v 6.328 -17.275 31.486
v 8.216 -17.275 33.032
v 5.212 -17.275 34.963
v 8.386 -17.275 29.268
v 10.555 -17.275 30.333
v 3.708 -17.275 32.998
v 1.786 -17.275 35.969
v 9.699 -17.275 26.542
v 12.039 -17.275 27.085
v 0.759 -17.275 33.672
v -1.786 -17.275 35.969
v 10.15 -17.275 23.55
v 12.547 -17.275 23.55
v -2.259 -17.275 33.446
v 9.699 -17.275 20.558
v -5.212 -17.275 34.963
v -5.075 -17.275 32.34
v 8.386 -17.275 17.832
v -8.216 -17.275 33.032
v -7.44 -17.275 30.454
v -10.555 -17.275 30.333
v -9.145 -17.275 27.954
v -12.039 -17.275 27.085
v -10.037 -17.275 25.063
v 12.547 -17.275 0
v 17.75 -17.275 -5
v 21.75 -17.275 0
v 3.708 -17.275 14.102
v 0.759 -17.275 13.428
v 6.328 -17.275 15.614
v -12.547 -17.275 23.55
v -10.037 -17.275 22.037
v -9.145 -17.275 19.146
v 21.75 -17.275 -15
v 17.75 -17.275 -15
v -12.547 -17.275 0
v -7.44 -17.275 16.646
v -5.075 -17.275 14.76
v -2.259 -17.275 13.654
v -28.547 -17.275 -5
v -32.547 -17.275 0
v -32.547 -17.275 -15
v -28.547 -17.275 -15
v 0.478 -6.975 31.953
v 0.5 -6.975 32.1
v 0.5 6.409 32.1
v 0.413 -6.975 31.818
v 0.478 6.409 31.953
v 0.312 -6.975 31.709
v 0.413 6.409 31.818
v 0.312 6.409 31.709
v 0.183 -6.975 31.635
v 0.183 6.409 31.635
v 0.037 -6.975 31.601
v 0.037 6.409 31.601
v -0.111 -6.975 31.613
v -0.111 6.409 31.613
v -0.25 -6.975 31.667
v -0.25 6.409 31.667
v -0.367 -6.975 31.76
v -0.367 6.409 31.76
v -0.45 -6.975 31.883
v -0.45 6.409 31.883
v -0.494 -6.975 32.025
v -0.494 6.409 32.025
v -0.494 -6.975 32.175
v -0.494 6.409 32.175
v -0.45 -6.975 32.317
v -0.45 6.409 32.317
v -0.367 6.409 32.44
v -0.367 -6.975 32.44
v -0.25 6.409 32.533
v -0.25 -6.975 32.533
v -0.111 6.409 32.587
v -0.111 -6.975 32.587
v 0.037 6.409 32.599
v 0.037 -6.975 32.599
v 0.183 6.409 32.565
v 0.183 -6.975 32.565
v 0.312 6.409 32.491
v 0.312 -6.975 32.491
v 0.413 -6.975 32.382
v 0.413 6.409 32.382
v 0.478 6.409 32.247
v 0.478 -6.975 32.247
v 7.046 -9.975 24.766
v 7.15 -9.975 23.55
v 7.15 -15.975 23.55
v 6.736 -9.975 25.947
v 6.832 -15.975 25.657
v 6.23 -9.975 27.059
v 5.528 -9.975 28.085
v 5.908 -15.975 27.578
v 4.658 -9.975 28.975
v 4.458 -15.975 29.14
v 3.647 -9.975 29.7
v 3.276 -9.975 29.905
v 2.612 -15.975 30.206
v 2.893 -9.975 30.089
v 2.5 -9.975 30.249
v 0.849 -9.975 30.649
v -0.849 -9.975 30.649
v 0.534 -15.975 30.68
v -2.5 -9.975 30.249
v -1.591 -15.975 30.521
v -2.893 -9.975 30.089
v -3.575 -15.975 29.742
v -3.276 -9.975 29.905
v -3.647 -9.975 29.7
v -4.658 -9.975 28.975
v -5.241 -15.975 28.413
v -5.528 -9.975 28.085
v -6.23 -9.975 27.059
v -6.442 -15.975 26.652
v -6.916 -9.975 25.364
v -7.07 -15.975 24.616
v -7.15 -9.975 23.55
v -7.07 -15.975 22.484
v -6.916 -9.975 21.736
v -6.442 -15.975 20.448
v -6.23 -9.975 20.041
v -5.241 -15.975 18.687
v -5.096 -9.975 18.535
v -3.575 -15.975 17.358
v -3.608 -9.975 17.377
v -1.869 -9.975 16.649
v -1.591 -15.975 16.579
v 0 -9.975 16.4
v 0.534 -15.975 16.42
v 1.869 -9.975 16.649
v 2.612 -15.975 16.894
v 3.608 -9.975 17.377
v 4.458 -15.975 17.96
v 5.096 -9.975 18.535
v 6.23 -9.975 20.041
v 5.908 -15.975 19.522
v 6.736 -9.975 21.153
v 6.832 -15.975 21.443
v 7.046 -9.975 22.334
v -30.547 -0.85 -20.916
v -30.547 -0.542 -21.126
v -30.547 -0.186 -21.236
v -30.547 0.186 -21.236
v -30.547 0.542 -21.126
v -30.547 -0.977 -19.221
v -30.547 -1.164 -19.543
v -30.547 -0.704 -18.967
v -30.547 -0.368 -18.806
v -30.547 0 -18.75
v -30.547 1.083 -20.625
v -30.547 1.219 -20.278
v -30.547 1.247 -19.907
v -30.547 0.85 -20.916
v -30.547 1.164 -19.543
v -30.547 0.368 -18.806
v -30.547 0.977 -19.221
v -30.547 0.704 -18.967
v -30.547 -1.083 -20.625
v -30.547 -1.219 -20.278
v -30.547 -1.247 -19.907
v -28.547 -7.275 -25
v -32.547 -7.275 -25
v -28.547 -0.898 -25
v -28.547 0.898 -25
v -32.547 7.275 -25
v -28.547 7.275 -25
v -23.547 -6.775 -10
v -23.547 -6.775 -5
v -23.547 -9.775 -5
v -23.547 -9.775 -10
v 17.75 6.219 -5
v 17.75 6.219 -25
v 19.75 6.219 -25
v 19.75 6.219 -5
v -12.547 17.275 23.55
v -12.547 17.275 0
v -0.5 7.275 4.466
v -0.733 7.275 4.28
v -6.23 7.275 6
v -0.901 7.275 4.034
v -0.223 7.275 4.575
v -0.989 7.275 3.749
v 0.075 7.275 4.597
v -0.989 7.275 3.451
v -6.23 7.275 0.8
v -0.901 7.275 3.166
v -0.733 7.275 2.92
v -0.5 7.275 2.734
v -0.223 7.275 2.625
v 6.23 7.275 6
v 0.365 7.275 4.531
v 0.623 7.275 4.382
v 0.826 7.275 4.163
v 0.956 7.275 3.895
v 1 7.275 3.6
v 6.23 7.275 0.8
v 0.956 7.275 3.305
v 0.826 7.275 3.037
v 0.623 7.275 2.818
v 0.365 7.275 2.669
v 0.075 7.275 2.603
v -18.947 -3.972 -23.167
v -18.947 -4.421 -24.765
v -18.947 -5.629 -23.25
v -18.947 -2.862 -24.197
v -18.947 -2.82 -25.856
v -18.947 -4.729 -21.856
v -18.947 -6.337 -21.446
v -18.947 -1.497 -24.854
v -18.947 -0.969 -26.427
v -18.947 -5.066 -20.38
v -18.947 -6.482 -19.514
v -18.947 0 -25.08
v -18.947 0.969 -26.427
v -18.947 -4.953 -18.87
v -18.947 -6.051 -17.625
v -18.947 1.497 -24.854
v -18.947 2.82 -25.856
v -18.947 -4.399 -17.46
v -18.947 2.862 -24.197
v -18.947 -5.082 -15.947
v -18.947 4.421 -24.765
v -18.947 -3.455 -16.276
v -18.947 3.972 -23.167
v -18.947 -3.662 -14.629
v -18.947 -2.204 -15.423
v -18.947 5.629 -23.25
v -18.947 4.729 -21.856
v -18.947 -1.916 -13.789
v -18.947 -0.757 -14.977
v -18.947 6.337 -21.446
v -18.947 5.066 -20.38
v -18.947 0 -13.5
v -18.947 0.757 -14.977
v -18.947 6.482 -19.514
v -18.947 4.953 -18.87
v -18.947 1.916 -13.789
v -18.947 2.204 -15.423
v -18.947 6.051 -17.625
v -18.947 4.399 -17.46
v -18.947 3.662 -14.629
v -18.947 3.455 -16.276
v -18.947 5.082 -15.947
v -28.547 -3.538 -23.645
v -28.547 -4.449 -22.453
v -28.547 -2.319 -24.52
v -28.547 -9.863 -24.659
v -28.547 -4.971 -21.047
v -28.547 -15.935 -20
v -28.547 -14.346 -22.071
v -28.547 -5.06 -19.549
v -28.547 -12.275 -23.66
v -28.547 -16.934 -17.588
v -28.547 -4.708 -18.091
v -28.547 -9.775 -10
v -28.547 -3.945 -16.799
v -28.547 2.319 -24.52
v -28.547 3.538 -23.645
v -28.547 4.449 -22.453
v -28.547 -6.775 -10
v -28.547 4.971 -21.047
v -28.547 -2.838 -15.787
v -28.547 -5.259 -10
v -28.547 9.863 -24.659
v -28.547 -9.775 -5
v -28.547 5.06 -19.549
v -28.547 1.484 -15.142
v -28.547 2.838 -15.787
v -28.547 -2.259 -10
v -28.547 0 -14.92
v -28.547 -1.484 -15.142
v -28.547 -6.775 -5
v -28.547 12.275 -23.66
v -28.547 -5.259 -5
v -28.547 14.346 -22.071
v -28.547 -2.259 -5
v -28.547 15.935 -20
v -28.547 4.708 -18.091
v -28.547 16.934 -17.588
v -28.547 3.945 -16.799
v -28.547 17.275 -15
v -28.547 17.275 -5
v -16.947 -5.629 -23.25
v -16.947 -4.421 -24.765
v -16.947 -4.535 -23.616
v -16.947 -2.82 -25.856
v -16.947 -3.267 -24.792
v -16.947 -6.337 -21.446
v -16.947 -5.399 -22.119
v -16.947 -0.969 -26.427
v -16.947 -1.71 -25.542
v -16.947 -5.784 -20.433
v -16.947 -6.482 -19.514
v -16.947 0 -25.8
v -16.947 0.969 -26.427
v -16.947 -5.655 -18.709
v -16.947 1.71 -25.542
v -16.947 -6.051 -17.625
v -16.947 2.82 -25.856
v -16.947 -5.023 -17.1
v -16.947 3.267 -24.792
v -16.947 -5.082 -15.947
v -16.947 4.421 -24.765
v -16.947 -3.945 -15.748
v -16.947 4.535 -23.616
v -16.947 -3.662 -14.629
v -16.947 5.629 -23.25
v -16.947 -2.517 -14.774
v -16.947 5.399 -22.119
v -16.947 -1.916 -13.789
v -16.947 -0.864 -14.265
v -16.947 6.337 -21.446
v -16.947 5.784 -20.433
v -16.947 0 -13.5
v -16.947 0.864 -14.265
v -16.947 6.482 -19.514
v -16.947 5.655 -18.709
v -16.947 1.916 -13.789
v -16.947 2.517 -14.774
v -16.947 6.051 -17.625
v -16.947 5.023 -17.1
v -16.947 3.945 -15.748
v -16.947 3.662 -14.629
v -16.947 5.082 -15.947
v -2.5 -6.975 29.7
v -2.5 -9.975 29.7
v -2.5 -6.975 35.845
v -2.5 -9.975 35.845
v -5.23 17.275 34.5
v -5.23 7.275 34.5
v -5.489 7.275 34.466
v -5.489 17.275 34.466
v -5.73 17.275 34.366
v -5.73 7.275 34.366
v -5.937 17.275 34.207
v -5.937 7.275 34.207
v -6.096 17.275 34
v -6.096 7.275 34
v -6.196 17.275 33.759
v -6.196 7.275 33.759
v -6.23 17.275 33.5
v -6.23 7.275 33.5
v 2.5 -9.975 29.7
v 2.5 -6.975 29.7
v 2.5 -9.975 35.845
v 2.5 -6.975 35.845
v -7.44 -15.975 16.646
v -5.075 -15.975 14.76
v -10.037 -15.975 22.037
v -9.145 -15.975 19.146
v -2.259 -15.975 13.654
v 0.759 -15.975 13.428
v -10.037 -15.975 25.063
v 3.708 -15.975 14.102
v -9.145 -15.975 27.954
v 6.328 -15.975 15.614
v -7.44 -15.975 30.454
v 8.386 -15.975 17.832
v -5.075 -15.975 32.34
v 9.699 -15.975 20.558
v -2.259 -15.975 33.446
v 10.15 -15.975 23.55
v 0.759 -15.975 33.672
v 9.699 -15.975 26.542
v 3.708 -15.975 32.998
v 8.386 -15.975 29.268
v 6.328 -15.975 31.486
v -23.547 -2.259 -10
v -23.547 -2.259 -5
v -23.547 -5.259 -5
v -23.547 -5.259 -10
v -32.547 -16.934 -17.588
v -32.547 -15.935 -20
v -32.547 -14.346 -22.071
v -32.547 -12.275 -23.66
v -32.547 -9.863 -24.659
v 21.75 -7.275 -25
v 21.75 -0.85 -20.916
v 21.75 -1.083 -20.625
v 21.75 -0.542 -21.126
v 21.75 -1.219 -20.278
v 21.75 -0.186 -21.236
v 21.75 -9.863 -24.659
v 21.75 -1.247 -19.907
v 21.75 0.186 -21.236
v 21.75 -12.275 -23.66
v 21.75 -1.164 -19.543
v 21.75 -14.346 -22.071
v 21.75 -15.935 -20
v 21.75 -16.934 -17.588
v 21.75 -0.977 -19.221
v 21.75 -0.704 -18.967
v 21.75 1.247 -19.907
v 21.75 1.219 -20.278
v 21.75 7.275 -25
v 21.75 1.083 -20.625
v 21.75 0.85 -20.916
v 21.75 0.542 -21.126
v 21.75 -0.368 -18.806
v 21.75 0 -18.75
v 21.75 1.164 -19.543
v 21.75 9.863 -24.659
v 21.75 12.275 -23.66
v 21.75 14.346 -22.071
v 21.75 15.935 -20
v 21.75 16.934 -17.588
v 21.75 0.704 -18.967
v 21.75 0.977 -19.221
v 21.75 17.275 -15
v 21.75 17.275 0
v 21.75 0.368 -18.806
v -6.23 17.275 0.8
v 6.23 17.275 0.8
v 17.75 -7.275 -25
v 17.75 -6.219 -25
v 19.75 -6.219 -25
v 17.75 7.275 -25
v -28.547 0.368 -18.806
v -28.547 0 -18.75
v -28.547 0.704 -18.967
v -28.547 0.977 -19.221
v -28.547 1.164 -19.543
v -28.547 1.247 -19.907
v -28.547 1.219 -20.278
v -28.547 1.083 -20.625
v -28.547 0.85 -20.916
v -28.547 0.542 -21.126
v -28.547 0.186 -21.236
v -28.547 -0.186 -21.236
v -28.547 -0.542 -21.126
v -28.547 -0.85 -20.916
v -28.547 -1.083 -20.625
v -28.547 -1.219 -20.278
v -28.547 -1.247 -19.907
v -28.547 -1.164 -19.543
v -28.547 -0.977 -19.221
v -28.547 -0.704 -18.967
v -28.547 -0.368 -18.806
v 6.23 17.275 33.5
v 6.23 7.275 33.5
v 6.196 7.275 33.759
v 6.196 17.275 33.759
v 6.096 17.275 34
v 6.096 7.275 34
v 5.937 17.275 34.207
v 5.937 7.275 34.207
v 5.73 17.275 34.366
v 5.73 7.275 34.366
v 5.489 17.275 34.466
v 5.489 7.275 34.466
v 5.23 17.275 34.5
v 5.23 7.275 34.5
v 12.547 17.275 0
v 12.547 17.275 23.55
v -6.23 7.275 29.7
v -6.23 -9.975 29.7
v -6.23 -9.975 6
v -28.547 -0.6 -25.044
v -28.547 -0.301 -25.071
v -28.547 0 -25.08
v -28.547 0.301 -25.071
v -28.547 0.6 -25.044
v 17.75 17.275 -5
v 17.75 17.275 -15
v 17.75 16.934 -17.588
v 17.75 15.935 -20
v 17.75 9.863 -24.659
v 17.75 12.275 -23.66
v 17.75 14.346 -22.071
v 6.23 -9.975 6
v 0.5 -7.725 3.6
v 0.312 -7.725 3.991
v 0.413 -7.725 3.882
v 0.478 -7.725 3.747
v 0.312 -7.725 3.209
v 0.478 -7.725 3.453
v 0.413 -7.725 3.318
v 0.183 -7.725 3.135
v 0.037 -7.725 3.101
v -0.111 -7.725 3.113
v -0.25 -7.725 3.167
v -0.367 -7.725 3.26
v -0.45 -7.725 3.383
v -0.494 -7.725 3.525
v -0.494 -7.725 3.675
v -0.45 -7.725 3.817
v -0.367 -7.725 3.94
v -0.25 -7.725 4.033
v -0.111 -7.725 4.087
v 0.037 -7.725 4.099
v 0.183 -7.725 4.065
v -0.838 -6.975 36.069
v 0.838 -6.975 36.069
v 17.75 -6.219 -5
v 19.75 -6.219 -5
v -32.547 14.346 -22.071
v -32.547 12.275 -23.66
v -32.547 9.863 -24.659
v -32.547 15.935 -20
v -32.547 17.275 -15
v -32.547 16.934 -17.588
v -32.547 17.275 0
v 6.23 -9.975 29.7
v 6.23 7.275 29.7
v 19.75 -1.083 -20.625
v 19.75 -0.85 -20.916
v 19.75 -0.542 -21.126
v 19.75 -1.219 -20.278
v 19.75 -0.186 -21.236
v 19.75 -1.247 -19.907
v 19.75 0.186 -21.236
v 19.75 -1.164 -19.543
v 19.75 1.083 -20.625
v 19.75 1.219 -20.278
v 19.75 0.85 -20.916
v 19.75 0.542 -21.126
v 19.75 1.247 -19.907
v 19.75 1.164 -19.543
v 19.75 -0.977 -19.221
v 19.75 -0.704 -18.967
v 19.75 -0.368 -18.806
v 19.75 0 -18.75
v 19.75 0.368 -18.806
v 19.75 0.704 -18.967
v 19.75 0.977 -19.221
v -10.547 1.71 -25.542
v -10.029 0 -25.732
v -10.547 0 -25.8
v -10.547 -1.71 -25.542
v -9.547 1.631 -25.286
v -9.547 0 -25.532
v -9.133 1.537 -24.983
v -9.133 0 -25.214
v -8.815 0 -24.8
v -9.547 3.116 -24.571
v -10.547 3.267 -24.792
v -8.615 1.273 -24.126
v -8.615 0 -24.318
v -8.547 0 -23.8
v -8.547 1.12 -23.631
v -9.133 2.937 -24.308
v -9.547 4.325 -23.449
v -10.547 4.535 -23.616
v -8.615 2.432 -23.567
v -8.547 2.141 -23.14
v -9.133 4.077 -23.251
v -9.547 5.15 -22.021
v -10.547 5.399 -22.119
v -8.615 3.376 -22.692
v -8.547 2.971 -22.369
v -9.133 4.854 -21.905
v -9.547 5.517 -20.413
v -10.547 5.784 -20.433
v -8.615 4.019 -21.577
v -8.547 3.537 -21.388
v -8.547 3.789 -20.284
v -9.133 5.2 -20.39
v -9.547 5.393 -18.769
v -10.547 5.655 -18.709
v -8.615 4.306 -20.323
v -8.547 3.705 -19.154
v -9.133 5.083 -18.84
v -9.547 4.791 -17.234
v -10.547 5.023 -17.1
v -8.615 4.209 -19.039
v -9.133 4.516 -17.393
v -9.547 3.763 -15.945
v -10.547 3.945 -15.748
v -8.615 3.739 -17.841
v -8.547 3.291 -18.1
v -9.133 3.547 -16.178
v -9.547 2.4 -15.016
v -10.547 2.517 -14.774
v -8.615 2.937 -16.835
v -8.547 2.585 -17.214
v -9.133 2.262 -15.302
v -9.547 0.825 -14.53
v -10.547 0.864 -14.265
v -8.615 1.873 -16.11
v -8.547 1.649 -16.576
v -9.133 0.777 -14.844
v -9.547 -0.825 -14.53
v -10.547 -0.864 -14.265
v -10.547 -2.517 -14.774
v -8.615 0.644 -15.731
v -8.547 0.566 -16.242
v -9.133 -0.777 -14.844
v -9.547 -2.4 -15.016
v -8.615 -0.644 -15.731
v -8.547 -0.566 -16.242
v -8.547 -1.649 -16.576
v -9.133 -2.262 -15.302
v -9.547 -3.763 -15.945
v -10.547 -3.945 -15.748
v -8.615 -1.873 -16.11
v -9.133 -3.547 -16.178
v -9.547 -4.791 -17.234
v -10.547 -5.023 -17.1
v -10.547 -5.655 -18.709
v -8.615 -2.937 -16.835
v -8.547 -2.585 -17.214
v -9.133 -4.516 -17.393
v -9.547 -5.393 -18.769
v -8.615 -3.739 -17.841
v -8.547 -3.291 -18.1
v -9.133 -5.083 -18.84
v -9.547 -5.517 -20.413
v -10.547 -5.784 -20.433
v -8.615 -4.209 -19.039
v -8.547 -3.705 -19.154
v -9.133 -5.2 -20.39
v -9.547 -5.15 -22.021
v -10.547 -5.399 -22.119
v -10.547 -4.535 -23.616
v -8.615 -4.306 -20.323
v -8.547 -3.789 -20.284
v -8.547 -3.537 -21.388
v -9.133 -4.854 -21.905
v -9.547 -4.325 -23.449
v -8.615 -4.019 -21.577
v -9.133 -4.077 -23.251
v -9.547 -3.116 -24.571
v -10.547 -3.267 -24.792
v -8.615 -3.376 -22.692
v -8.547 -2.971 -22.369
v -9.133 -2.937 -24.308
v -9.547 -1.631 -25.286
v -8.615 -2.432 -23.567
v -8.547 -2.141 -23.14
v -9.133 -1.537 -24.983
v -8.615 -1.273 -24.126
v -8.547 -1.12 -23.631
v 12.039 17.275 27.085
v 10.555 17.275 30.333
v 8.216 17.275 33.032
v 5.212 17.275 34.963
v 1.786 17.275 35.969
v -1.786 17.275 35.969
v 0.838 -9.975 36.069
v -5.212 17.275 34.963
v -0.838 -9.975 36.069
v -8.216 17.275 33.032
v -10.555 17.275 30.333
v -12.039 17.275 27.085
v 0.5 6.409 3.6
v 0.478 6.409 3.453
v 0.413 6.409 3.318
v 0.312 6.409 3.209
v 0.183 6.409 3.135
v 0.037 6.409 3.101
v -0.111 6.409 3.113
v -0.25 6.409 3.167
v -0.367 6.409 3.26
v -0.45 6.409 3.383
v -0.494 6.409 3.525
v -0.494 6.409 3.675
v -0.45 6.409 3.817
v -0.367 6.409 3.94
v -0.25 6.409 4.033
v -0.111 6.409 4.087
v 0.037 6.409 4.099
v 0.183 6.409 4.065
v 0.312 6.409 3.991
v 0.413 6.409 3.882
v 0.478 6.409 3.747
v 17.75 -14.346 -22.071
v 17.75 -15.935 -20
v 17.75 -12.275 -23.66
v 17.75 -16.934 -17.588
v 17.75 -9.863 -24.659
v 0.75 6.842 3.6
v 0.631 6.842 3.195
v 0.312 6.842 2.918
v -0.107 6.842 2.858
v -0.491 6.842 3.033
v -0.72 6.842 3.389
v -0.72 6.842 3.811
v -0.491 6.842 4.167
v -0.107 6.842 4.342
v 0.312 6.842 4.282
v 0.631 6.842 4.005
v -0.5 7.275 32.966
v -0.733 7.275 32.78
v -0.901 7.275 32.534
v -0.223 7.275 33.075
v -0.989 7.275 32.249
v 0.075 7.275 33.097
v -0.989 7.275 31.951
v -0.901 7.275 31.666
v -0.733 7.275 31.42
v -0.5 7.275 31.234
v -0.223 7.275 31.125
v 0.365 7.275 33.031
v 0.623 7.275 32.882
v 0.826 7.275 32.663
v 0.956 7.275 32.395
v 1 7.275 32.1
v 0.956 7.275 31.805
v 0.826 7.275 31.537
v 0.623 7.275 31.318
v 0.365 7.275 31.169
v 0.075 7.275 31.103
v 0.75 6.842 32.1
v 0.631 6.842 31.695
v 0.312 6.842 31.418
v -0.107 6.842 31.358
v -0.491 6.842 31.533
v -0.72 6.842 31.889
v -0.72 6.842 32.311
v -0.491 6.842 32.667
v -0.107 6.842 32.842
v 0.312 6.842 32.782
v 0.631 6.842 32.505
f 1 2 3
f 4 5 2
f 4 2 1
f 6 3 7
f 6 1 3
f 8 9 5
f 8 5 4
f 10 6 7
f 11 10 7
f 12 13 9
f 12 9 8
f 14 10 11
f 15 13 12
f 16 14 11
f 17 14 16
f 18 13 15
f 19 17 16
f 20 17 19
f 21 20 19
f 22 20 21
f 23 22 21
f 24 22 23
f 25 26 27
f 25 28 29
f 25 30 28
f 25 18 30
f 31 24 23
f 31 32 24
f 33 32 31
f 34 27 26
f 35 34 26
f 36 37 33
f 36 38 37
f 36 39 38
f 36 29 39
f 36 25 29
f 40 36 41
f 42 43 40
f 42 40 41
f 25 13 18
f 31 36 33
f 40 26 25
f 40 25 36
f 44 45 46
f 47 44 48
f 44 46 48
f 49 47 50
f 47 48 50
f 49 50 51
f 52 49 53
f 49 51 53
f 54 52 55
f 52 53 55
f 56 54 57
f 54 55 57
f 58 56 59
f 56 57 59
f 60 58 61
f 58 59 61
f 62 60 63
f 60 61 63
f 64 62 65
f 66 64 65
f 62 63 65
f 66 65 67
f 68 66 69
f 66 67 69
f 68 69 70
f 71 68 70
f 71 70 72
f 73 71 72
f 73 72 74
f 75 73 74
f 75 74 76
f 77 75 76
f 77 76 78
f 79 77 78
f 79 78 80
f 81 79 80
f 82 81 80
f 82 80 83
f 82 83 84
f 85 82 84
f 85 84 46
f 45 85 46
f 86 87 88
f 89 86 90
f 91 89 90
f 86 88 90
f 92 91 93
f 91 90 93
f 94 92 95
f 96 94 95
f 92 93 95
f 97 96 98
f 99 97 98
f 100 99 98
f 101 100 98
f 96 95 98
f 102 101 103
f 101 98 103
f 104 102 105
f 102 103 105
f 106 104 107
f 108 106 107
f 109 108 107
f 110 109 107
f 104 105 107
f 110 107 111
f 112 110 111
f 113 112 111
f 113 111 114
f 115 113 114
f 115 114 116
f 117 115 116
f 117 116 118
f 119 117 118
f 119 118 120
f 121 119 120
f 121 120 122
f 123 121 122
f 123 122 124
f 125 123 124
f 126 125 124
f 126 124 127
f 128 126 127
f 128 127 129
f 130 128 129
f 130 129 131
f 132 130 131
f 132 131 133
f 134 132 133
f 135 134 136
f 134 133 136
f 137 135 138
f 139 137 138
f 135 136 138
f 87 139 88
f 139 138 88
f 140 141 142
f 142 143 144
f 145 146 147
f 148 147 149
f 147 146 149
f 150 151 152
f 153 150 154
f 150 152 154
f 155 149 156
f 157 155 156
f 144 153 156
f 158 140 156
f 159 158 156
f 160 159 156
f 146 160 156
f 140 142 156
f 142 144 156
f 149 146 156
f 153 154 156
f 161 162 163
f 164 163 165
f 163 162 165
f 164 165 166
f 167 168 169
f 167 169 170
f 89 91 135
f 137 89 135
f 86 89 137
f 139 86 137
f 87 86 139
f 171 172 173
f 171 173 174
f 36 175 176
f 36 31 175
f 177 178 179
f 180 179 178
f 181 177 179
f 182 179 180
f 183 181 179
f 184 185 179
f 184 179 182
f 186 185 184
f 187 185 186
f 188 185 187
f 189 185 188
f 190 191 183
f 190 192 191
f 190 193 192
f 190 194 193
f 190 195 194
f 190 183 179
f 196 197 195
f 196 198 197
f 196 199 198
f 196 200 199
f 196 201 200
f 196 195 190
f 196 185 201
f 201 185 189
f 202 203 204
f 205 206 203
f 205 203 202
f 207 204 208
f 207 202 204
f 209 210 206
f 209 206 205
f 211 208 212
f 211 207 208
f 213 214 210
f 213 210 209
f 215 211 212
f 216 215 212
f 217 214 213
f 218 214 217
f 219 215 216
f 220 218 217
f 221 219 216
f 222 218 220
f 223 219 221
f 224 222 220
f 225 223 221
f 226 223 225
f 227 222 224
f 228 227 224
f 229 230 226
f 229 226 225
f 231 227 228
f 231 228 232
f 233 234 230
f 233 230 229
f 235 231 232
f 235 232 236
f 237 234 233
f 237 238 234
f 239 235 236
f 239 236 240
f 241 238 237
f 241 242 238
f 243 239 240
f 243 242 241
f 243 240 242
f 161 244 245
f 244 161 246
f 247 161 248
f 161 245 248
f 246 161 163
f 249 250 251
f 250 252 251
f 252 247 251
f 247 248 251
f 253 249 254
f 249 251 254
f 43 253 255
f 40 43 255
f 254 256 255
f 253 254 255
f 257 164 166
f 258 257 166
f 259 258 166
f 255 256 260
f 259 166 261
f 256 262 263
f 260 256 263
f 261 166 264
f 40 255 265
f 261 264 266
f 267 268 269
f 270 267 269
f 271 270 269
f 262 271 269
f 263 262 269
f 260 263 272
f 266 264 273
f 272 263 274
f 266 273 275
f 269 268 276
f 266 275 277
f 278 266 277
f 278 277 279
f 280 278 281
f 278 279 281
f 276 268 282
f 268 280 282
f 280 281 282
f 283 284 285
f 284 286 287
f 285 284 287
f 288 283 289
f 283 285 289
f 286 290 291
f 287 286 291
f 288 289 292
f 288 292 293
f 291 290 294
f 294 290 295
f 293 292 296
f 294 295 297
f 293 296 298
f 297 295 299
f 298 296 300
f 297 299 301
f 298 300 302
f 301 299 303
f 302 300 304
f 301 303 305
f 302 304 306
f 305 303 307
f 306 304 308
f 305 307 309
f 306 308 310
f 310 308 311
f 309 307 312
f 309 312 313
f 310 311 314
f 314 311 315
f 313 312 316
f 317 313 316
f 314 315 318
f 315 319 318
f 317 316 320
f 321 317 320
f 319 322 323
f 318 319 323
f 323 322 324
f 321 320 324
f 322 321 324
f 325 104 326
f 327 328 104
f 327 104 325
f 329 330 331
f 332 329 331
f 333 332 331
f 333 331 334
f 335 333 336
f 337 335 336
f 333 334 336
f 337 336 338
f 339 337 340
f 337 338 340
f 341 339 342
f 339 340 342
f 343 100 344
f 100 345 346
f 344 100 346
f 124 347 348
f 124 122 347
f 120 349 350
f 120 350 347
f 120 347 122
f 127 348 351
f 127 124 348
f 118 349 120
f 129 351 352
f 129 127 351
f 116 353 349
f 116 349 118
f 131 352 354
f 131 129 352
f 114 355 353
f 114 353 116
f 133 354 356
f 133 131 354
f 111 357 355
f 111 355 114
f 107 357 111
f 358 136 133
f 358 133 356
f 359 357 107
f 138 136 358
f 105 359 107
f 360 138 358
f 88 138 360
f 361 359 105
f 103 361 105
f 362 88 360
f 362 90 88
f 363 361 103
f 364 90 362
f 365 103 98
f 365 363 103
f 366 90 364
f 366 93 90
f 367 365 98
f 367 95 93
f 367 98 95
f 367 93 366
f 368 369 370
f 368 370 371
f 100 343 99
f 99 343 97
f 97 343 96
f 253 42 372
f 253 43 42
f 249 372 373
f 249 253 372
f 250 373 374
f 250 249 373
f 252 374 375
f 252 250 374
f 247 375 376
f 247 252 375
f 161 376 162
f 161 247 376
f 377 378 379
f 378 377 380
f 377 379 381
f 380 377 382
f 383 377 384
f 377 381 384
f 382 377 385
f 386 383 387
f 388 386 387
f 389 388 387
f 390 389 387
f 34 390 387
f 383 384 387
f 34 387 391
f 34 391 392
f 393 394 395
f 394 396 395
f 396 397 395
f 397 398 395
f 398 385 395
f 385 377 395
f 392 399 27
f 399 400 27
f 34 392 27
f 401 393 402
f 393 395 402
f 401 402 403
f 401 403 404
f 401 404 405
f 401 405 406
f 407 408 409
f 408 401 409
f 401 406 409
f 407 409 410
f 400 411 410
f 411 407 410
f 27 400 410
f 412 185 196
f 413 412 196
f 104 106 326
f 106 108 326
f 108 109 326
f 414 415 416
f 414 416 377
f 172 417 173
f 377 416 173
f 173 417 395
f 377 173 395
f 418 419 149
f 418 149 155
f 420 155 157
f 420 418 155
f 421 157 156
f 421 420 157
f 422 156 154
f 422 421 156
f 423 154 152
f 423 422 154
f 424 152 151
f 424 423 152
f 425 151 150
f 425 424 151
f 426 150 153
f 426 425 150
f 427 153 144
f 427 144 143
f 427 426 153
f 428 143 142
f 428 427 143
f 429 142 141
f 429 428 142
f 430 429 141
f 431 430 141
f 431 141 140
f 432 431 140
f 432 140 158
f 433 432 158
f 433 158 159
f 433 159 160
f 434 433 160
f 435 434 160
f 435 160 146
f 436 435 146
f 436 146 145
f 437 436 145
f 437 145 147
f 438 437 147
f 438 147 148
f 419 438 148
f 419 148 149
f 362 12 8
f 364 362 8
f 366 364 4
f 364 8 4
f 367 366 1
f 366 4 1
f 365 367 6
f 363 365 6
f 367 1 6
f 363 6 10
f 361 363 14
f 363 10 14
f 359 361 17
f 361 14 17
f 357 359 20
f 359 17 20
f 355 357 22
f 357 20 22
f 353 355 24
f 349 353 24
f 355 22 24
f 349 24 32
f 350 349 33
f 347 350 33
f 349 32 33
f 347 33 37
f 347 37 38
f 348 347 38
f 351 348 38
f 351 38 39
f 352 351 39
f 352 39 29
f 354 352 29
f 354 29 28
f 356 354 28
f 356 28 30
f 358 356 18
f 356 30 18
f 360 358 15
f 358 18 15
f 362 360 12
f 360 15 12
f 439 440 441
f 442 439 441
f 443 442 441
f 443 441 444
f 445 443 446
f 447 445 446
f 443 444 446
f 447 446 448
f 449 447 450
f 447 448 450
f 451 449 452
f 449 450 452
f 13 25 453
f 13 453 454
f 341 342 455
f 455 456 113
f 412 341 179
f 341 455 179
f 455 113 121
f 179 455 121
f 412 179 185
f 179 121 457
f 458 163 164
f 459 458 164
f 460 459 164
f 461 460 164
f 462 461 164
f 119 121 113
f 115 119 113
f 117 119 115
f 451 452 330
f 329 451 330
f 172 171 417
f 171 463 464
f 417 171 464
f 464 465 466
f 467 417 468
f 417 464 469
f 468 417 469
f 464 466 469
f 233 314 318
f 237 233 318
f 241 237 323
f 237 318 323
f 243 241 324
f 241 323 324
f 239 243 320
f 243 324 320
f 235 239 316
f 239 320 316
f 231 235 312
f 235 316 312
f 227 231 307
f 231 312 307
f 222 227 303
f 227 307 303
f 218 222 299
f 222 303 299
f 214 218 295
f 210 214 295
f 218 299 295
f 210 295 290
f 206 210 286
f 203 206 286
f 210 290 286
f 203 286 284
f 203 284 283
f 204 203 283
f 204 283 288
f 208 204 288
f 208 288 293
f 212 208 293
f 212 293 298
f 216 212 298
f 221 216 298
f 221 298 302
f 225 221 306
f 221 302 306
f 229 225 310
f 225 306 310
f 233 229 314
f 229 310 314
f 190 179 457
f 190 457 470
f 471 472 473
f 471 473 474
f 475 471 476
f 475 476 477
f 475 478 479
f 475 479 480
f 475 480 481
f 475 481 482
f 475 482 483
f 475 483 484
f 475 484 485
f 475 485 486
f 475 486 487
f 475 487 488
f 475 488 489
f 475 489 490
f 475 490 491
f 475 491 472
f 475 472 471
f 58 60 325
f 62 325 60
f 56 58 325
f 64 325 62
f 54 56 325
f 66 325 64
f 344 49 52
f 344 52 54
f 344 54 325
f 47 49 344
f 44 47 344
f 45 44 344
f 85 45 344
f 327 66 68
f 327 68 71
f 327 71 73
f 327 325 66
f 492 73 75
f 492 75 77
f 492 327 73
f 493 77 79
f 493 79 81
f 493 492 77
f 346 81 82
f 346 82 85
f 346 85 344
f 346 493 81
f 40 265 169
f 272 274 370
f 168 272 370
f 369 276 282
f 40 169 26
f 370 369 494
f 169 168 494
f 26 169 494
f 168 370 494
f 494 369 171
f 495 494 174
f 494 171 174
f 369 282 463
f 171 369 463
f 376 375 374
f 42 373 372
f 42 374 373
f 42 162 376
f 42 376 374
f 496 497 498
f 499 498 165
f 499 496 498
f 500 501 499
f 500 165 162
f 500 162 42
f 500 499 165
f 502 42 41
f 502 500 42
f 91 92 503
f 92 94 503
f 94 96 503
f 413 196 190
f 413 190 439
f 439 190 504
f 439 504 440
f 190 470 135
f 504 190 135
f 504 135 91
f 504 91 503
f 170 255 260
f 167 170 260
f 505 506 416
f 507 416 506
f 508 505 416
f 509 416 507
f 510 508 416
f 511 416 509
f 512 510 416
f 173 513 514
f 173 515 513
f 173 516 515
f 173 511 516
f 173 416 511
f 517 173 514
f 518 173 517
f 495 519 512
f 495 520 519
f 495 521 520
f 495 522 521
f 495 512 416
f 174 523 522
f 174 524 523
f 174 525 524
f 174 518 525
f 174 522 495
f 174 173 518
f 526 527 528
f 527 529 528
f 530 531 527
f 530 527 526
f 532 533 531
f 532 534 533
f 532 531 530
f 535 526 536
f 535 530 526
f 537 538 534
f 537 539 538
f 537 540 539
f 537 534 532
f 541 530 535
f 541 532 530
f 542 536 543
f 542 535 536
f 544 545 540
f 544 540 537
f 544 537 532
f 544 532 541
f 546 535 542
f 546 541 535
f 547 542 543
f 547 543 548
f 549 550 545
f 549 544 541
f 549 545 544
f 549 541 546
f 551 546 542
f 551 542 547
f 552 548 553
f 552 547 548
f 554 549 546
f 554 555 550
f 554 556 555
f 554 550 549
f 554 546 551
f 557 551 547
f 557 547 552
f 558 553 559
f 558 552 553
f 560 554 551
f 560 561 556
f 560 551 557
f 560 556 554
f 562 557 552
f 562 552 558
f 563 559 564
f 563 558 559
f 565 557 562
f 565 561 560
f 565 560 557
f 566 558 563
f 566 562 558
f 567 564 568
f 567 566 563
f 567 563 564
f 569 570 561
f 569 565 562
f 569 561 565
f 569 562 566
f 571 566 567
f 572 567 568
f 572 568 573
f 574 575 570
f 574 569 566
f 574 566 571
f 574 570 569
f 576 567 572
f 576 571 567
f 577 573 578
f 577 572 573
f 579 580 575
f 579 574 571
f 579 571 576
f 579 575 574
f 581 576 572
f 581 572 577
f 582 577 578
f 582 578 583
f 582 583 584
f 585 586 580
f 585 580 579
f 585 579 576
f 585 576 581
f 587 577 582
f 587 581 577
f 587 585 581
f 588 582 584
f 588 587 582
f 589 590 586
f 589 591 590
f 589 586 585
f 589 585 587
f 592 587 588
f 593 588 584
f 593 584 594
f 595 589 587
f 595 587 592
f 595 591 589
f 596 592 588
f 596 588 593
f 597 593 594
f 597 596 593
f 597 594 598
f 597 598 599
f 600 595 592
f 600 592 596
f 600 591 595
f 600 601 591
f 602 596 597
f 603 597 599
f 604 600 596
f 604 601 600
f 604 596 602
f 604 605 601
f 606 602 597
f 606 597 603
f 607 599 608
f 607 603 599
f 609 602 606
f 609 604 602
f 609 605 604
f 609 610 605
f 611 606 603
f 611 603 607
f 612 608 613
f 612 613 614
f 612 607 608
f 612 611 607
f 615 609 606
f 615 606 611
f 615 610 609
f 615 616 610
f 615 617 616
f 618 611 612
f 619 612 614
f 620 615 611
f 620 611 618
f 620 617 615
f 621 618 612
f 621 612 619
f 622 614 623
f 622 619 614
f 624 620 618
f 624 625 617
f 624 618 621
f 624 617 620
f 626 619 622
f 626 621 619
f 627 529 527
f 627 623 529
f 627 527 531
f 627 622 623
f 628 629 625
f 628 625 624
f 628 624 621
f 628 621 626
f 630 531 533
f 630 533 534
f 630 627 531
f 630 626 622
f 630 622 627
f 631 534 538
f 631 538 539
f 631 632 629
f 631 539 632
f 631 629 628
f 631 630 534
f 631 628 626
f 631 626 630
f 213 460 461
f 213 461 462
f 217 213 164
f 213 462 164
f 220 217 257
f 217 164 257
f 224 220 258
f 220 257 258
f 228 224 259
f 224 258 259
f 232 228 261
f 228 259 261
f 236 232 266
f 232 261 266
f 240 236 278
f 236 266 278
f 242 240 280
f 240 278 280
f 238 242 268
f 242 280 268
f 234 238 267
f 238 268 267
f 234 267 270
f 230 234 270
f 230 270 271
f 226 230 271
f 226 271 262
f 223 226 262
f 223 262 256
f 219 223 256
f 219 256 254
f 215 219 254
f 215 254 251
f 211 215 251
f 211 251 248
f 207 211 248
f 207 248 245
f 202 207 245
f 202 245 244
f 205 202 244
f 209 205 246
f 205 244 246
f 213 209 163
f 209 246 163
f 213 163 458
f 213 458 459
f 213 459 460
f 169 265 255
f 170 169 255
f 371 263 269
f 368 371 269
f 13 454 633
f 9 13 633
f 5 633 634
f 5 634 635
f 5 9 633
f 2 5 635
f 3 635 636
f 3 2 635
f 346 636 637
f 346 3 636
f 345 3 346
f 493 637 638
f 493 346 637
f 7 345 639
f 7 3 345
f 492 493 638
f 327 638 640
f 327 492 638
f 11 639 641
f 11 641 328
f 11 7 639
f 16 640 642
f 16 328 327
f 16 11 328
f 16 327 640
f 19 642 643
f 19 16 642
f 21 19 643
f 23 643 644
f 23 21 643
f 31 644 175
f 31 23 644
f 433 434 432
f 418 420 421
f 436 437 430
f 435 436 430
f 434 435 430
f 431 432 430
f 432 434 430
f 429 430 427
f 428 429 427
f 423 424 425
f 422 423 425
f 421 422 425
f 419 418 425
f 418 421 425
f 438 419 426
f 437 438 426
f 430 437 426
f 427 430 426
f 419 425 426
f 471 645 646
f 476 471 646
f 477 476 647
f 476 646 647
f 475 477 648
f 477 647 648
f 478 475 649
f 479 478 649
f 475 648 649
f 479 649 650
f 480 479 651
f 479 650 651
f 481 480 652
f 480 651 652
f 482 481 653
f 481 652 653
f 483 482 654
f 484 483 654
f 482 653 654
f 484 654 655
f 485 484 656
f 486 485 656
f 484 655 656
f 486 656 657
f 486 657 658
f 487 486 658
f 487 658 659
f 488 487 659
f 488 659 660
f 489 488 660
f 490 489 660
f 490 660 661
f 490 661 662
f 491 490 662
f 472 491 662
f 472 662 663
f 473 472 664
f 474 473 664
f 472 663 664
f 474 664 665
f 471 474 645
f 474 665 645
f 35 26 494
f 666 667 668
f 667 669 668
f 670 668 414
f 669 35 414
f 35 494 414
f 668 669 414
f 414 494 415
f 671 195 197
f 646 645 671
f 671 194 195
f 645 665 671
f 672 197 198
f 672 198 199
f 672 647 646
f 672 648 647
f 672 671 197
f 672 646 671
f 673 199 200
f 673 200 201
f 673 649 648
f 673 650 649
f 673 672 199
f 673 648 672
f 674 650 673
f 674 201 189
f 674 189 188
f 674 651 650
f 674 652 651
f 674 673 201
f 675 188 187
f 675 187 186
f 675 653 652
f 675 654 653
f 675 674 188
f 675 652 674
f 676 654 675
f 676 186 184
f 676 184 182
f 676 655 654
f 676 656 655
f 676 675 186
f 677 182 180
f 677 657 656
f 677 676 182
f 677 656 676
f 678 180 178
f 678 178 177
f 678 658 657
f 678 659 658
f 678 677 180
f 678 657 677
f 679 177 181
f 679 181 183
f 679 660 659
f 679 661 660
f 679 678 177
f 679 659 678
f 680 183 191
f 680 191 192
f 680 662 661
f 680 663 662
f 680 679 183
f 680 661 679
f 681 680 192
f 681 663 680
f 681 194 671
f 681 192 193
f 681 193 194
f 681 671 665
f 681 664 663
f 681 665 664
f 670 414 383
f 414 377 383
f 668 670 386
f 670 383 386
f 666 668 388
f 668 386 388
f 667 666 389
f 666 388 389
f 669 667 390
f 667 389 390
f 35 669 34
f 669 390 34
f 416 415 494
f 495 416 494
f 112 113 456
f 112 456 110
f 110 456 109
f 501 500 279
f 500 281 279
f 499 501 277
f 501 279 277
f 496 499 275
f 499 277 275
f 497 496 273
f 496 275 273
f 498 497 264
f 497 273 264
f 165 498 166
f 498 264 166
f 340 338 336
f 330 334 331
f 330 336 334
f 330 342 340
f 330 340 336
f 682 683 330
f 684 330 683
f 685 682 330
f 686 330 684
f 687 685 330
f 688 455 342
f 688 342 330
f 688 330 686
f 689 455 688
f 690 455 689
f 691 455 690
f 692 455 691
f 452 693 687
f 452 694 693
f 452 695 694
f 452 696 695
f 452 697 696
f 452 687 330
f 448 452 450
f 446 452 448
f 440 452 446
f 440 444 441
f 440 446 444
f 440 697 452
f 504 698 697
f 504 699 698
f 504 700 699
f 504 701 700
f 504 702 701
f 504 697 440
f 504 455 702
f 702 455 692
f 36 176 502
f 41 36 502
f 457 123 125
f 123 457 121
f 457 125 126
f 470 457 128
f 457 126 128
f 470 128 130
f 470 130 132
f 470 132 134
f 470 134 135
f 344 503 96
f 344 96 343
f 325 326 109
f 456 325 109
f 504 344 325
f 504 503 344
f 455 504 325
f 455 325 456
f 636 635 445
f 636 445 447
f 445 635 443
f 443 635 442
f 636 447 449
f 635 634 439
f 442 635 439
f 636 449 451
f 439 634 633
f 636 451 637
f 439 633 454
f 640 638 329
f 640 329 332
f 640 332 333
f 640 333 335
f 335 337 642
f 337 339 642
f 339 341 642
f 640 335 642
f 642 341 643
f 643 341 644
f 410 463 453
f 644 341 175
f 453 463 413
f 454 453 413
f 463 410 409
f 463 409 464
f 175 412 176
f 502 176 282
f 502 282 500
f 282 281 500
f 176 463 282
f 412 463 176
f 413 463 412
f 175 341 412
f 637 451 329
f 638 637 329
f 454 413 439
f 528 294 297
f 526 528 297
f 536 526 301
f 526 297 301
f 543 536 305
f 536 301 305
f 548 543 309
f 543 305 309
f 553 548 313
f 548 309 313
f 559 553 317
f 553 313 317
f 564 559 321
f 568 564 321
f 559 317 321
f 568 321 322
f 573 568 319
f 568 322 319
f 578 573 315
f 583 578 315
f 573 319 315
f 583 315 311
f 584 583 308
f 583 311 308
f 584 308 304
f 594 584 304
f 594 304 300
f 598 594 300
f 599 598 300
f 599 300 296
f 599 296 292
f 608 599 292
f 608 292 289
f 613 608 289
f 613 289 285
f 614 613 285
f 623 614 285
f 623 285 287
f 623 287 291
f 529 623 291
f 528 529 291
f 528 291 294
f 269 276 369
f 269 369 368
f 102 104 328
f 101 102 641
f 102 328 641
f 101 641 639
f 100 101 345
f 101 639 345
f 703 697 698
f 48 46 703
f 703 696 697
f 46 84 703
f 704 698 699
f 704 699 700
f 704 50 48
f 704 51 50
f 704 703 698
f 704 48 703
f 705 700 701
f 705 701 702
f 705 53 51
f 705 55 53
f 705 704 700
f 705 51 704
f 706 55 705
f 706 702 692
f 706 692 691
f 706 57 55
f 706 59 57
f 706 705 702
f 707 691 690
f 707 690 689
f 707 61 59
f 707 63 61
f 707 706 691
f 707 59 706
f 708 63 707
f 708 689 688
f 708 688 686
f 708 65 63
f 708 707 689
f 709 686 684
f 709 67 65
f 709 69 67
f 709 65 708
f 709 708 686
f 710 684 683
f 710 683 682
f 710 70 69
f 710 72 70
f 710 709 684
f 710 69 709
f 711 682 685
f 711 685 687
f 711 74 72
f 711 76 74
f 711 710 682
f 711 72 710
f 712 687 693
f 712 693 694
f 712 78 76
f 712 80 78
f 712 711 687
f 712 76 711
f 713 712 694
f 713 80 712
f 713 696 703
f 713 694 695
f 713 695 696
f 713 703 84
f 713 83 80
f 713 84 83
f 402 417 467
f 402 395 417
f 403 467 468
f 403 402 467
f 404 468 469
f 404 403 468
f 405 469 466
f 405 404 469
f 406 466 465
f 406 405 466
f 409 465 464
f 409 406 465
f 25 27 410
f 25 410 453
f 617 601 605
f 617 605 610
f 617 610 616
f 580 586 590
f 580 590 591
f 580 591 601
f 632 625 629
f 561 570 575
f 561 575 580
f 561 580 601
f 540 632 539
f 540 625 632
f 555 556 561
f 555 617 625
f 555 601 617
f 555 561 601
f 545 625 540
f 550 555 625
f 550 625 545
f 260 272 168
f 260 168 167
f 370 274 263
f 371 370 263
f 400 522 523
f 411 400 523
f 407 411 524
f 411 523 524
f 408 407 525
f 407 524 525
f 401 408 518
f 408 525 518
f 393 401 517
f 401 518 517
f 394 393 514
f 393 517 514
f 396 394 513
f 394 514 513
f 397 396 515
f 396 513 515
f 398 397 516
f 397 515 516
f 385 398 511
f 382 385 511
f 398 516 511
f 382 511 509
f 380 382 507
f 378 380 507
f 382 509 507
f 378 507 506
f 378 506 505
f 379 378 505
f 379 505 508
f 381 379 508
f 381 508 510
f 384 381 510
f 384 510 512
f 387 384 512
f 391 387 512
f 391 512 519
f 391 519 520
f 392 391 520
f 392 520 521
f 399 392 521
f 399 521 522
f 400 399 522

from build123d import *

# Parameters (mm, degrees)
SKETCH4_W                = 12.46
SKETCH4_H                = 17.25
BOSS_EXTRUDE3_DEPTH      = 6
SKETCH8_R                = 12.546781182
SKETCH8_R_2              = 11.15
BOSS_EXTRUDE6_DEPTH      = 7.3
BOSS_EXTRUDE6_DEPTH_BACK = 17.25
BOSS_EXTRUDE4_DEPTH      = 17.25
SKETCH6_R                = 0.5
CUT_EXTRUDE1_DEPTH       = 15
CHAMFER1_SIZE            = 0.5
CHAMFER1_SIZE2           = 0.866025404
SKETCH10_W               = 12.46
SKETCH10_H               = 23.7
CUT_EXTRUDE3_DEPTH       = 17.25
CUT_EXTRUDE4_REACH       = 38.097
SKETCH11_W               = 5
SKETCH11_H               = 3
BOSS_EXTRUDE7_DEPTH      = 7.3
BOSS_EXTRUDE9_DEPTH      = 10
SKETCH20_R               = 11.15
SKETCH20_R_2             = 7.15
BOSS_EXTRUDE11_DEPTH     = 7.3
SKETCH21_R               = 10.15
SKETCH21_R_2             = 7.15
CUT_EXTRUDE7_DEPTH       = 1.3
BOSS_EXTRUDE10_DEPTH     = 34.55
SKETCH18_W               = 20
SKETCH18_H               = 12.438292938
CUT_EXTRUDE5_DEPTH       = 2
SKETCH19_R               = 1.25
CUT_EXTRUDE6_DEPTH       = 53.296781182
CUT_EXTRUDE6_DEPTH_BACK  = 3
FILLET1_R                = 10
SKETCH22_R               = 5.8
BOSS_EXTRUDE12_DEPTH     = 20
FILLET2_R                = 2
SKETCH23_R               = 5.930854157
SKETCH23_R_2             = 5.08
CUT_EXTRUDE8_DEPTH       = 11.6
SKETCH24_R               = 6.5
BOSS_EXTRUDE13_DEPTH     = 2
SKETCH25_R               = 1.25
BOSS_EXTRUDE14_DEPTH     = 2
SKETCH26_W               = 5
SKETCH26_H               = 3
BOSS_EXTRUDE15_DEPTH     = 5


with BuildPart() as part:
    # Sketch4 → Boss-Extrude3 (new body)
    with BuildSketch(Plane.XY):
        with Locations((0, -1.35)):
            Rectangle(SKETCH4_W, SKETCH4_H)
    extrude(amount=BOSS_EXTRUDE3_DEPTH)



with BuildPart() as body_2:
    # Sketch8 → Boss-Extrude6 (new body, two sides)
    with BuildSketch(Plane(origin=(0, -9.975, 0), x_dir=(-1, 0, 0), z_dir=(0, -1, 0))) as boss_extrude6_sk:
        with Locations((0, -23.55)):
            Circle(SKETCH8_R)
        with Locations((0, -23.55)):
            Circle(SKETCH8_R_2, mode=Mode.SUBTRACT)
    extrude(amount=BOSS_EXTRUDE6_DEPTH)
    extrude(boss_extrude6_sk.sketch, amount=-BOSS_EXTRUDE6_DEPTH_BACK)


with BuildPart() as part_1:
    add(part.part)

    add(body_2.part)  # Boss-Extrude4 merges body 2
    # Sketch5 → Boss-Extrude4 (add)
    with BuildSketch(Plane(origin=(0, 7.275, 0), x_dir=(1, 0, 0), z_dir=(0, 1, 0))):
        with BuildLine():
            Line((12.546781182, -23.55), (12.546781182, 0))
            Line((12.546781182, 0), (6.23, 0))
            Line((6.23, 0), (6.23, -29.7))
            Line((6.23, -29.7), (-6.23, -29.7))
            Line((-6.23, -29.7), (-6.23, 0))
            Line((-6.23, 0), (-12.546781182, 0))
            Line((-12.546781182, 0), (-12.546781182, -23.55))
            ThreePointArc((-12.546781182, -23.55), (0, -36.096781182), (12.546781182, -23.55))
        make_face()
    extrude(amount=-BOSS_EXTRUDE4_DEPTH)

    # Sketch6 → Cut-Extrude1 (cut)
    with BuildSketch(Plane(origin=(0, 7.275, 0), x_dir=(1, 0, 0), z_dir=(0, 1, 0))):
        with Locations((0, -3.6)):
            Circle(SKETCH6_R)
        with Locations((0, -32.1)):
            Circle(SKETCH6_R)
    extrude(amount=-CUT_EXTRUDE1_DEPTH, mode=Mode.SUBTRACT)

    # Chamfer1
    chamfer1_edges = [part_1.edges().sort_by_distance(p)[0] for p in [
        (-0.5, 7.275, 3.6),
        (-0.5, 7.275, 32.1),
    ]]
    chamfer1_side = [part_1.faces().sort_by_distance(p)[0] for p in [
        (0, 7.275, 35.657160381),
    ]]
    chamfer(chamfer1_edges, length=CHAMFER1_SIZE, length2=CHAMFER1_SIZE2, reference=chamfer1_side[0])

    # Sketch10 → Cut-Extrude3 (cut)
    with BuildSketch(Plane(origin=(0, 7.275, 0), x_dir=(1, 0, 0), z_dir=(0, 1, 0))):
        with Locations((0, -17.85)):
            Rectangle(SKETCH10_W, SKETCH10_H)
    extrude(amount=-CUT_EXTRUDE3_DEPTH, mode=Mode.SUBTRACT)

    # Sketch11 → Cut-Extrude4 (cut, up to next)
    with BuildSketch(Plane.XY.offset(36.096781182), mode=Mode.PRIVATE) as cut_extrude4_sk1:
        with Locations((0, -8.475)):
            Rectangle(SKETCH11_W, SKETCH11_H)
    cut_extrude4_tool1 = extrude(cut_extrude4_sk1.sketch, amount=-CUT_EXTRUDE4_REACH, mode=Mode.PRIVATE) & part_1.part
    add(cut_extrude4_tool1.solids().sort_by_distance((0, -8.475, 36.096781))[0], mode=Mode.SUBTRACT)

    # Sketch13 → Boss-Extrude7 (add)
    with BuildSketch(Plane.XZ.offset(17.275)):
        with BuildLine():
            Line((-12.546781182, 23.55), (-12.546781182, 0))
            Line((-12.546781182, 0), (12.546781182, 0))
            Line((12.546781182, 0), (12.546781182, 23.55))
            ThreePointArc((12.546781182, 23.55), (0, 11.003218818), (-12.546781182, 23.55))
        make_face()
    extrude(amount=-BOSS_EXTRUDE7_DEPTH)

    # Sketch15 → Boss-Extrude9 (add)
    with BuildSketch(Plane(origin=(0, 7.275, 0), x_dir=(1, 0, 0), z_dir=(0, 1, 0))):
        with BuildLine():
            Line((-12.546781182, 0), (12.546781182, 0))
            Line((12.546781182, 0), (12.546781182, -23.55))
            ThreePointArc((12.546781182, -23.55), (0, -36.096781182), (-12.546781182, -23.55))
            Line((-12.546781182, -23.55), (-12.546781182, 0))
        make_face()
        with BuildLine():
            Line((-6.23, -0.8), (6.23, -0.8))
            Line((6.23, -0.8), (6.23, -33.5))
            ThreePointArc((6.23, -33.5), (5.937106781, -34.207106781), (5.23, -34.5))
            Line((5.23, -34.5), (-5.23, -34.5))
            ThreePointArc((-5.23, -34.5), (-5.937106781, -34.207106781), (-6.23, -33.5))
            Line((-6.23, -33.5), (-6.23, -0.8))
        make_face(mode=Mode.SUBTRACT)
    extrude(amount=BOSS_EXTRUDE9_DEPTH)

    # Sketch20 → Boss-Extrude11 (add)
    with BuildSketch(Plane.XZ.offset(17.275)):
        with Locations((0, 23.55)):
            Circle(SKETCH20_R)
        with Locations((0, 23.55)):
            Circle(SKETCH20_R_2, mode=Mode.SUBTRACT)
    extrude(amount=-BOSS_EXTRUDE11_DEPTH)

    # Sketch21 → Cut-Extrude7 (cut)
    with BuildSketch(Plane.XZ.offset(17.275)):
        with Locations((0, 23.55)):
            Circle(SKETCH21_R)
        with Locations((0, 23.55)):
            Circle(SKETCH21_R_2, mode=Mode.SUBTRACT)
    extrude(amount=-CUT_EXTRUDE7_DEPTH, mode=Mode.SUBTRACT)

    # Sketch17 → Boss-Extrude10 (add)
    with BuildSketch(Plane(origin=(0, 17.275, 0), x_dir=(1, 0, 0), z_dir=(0, 1, 0))):
        Polygon((21.75, 25), (21.75, 0), (-32.546781182, 0), (-32.546781182, 25), (-28.546781182, 25), (-28.546781182, 5), (17.75, 5), (17.75, 25), align=None)
    extrude(amount=-BOSS_EXTRUDE10_DEPTH)

    # Sketch18 → Cut-Extrude5 (cut)
    with BuildSketch(Plane.ZY.offset(-17.75)):
        with Locations((-15, 0)):
            Rectangle(SKETCH18_W, SKETCH18_H)
    extrude(amount=-CUT_EXTRUDE5_DEPTH, mode=Mode.SUBTRACT)

    # Sketch19 → Cut-Extrude6 (cut, two sides)
    with BuildSketch(Plane.ZY.offset(-19.75)) as cut_extrude6_sk:
        with Locations((-20, 0)):
            Circle(SKETCH19_R)
    extrude(amount=CUT_EXTRUDE6_DEPTH, mode=Mode.SUBTRACT)
    extrude(cut_extrude6_sk.sketch, amount=-CUT_EXTRUDE6_DEPTH_BACK, mode=Mode.SUBTRACT)

    # Fillet1
    fillet1_edges = [part_1.edges().sort_by_distance(p)[0] for p in [
        (19.75, 17.275, -25),
        (-30.546781182, 17.275, -25),
        (-30.546781182, -17.275, -25),
        (19.75, -17.275, -25),
    ]]
    fillet(fillet1_edges, radius=FILLET1_R)

    # Sketch22 → Boss-Extrude12 (add)
    with BuildSketch(Plane(origin=(-28.546781182, 0, 0), x_dir=(0, 0, -1), z_dir=(1, 0, 0))):
        with Locations((20, 0)):
            Circle(SKETCH22_R)
    extrude(amount=BOSS_EXTRUDE12_DEPTH)

    # Fillet2
    fillet2_edges = [part_1.edges().sort_by_distance(p)[0] for p in [
        (-8.546781182, 0, -14.2),
    ]]
    fillet(fillet2_edges, radius=FILLET2_R)

    # Sketch23 → Cut-Extrude8 (cut)
    with BuildSketch(Plane(origin=(-28.546781182, 0, 0), x_dir=(0, 0, -1), z_dir=(1, 0, 0))):
        with Locations((20, 0)):
            Circle(SKETCH23_R)
        with Locations((20, 0)):
            Circle(SKETCH23_R_2, mode=Mode.SUBTRACT)
    extrude(amount=CUT_EXTRUDE8_DEPTH, mode=Mode.SUBTRACT)

    # Sketch24 → Boss-Extrude13 (add)
    with BuildSketch(Plane.ZY.offset(16.946781182)):
        with Locations((-20, 0)):
            Circle(SKETCH24_R)
    extrude(amount=BOSS_EXTRUDE13_DEPTH)

    # Sketch25 → Boss-Extrude14 (add)
    with BuildSketch(Plane.ZY.offset(32.546781182)):
        with Locations((-20, 0)):
            Circle(SKETCH25_R)
    extrude(amount=-BOSS_EXTRUDE14_DEPTH)

    # Sketch26 → Boss-Extrude15 (add)
    with BuildSketch(Plane(origin=(-28.546781182, 0, 0), x_dir=(0, 0, -1), z_dir=(1, 0, 0))):
        with Locations((7.5, -8.275)):
            Rectangle(SKETCH26_W, SKETCH26_H)
        with Locations((7.5, -3.759)):
            Rectangle(SKETCH26_W, SKETCH26_H)
    extrude(amount=BOSS_EXTRUDE15_DEPTH)


solid = part_1.part
